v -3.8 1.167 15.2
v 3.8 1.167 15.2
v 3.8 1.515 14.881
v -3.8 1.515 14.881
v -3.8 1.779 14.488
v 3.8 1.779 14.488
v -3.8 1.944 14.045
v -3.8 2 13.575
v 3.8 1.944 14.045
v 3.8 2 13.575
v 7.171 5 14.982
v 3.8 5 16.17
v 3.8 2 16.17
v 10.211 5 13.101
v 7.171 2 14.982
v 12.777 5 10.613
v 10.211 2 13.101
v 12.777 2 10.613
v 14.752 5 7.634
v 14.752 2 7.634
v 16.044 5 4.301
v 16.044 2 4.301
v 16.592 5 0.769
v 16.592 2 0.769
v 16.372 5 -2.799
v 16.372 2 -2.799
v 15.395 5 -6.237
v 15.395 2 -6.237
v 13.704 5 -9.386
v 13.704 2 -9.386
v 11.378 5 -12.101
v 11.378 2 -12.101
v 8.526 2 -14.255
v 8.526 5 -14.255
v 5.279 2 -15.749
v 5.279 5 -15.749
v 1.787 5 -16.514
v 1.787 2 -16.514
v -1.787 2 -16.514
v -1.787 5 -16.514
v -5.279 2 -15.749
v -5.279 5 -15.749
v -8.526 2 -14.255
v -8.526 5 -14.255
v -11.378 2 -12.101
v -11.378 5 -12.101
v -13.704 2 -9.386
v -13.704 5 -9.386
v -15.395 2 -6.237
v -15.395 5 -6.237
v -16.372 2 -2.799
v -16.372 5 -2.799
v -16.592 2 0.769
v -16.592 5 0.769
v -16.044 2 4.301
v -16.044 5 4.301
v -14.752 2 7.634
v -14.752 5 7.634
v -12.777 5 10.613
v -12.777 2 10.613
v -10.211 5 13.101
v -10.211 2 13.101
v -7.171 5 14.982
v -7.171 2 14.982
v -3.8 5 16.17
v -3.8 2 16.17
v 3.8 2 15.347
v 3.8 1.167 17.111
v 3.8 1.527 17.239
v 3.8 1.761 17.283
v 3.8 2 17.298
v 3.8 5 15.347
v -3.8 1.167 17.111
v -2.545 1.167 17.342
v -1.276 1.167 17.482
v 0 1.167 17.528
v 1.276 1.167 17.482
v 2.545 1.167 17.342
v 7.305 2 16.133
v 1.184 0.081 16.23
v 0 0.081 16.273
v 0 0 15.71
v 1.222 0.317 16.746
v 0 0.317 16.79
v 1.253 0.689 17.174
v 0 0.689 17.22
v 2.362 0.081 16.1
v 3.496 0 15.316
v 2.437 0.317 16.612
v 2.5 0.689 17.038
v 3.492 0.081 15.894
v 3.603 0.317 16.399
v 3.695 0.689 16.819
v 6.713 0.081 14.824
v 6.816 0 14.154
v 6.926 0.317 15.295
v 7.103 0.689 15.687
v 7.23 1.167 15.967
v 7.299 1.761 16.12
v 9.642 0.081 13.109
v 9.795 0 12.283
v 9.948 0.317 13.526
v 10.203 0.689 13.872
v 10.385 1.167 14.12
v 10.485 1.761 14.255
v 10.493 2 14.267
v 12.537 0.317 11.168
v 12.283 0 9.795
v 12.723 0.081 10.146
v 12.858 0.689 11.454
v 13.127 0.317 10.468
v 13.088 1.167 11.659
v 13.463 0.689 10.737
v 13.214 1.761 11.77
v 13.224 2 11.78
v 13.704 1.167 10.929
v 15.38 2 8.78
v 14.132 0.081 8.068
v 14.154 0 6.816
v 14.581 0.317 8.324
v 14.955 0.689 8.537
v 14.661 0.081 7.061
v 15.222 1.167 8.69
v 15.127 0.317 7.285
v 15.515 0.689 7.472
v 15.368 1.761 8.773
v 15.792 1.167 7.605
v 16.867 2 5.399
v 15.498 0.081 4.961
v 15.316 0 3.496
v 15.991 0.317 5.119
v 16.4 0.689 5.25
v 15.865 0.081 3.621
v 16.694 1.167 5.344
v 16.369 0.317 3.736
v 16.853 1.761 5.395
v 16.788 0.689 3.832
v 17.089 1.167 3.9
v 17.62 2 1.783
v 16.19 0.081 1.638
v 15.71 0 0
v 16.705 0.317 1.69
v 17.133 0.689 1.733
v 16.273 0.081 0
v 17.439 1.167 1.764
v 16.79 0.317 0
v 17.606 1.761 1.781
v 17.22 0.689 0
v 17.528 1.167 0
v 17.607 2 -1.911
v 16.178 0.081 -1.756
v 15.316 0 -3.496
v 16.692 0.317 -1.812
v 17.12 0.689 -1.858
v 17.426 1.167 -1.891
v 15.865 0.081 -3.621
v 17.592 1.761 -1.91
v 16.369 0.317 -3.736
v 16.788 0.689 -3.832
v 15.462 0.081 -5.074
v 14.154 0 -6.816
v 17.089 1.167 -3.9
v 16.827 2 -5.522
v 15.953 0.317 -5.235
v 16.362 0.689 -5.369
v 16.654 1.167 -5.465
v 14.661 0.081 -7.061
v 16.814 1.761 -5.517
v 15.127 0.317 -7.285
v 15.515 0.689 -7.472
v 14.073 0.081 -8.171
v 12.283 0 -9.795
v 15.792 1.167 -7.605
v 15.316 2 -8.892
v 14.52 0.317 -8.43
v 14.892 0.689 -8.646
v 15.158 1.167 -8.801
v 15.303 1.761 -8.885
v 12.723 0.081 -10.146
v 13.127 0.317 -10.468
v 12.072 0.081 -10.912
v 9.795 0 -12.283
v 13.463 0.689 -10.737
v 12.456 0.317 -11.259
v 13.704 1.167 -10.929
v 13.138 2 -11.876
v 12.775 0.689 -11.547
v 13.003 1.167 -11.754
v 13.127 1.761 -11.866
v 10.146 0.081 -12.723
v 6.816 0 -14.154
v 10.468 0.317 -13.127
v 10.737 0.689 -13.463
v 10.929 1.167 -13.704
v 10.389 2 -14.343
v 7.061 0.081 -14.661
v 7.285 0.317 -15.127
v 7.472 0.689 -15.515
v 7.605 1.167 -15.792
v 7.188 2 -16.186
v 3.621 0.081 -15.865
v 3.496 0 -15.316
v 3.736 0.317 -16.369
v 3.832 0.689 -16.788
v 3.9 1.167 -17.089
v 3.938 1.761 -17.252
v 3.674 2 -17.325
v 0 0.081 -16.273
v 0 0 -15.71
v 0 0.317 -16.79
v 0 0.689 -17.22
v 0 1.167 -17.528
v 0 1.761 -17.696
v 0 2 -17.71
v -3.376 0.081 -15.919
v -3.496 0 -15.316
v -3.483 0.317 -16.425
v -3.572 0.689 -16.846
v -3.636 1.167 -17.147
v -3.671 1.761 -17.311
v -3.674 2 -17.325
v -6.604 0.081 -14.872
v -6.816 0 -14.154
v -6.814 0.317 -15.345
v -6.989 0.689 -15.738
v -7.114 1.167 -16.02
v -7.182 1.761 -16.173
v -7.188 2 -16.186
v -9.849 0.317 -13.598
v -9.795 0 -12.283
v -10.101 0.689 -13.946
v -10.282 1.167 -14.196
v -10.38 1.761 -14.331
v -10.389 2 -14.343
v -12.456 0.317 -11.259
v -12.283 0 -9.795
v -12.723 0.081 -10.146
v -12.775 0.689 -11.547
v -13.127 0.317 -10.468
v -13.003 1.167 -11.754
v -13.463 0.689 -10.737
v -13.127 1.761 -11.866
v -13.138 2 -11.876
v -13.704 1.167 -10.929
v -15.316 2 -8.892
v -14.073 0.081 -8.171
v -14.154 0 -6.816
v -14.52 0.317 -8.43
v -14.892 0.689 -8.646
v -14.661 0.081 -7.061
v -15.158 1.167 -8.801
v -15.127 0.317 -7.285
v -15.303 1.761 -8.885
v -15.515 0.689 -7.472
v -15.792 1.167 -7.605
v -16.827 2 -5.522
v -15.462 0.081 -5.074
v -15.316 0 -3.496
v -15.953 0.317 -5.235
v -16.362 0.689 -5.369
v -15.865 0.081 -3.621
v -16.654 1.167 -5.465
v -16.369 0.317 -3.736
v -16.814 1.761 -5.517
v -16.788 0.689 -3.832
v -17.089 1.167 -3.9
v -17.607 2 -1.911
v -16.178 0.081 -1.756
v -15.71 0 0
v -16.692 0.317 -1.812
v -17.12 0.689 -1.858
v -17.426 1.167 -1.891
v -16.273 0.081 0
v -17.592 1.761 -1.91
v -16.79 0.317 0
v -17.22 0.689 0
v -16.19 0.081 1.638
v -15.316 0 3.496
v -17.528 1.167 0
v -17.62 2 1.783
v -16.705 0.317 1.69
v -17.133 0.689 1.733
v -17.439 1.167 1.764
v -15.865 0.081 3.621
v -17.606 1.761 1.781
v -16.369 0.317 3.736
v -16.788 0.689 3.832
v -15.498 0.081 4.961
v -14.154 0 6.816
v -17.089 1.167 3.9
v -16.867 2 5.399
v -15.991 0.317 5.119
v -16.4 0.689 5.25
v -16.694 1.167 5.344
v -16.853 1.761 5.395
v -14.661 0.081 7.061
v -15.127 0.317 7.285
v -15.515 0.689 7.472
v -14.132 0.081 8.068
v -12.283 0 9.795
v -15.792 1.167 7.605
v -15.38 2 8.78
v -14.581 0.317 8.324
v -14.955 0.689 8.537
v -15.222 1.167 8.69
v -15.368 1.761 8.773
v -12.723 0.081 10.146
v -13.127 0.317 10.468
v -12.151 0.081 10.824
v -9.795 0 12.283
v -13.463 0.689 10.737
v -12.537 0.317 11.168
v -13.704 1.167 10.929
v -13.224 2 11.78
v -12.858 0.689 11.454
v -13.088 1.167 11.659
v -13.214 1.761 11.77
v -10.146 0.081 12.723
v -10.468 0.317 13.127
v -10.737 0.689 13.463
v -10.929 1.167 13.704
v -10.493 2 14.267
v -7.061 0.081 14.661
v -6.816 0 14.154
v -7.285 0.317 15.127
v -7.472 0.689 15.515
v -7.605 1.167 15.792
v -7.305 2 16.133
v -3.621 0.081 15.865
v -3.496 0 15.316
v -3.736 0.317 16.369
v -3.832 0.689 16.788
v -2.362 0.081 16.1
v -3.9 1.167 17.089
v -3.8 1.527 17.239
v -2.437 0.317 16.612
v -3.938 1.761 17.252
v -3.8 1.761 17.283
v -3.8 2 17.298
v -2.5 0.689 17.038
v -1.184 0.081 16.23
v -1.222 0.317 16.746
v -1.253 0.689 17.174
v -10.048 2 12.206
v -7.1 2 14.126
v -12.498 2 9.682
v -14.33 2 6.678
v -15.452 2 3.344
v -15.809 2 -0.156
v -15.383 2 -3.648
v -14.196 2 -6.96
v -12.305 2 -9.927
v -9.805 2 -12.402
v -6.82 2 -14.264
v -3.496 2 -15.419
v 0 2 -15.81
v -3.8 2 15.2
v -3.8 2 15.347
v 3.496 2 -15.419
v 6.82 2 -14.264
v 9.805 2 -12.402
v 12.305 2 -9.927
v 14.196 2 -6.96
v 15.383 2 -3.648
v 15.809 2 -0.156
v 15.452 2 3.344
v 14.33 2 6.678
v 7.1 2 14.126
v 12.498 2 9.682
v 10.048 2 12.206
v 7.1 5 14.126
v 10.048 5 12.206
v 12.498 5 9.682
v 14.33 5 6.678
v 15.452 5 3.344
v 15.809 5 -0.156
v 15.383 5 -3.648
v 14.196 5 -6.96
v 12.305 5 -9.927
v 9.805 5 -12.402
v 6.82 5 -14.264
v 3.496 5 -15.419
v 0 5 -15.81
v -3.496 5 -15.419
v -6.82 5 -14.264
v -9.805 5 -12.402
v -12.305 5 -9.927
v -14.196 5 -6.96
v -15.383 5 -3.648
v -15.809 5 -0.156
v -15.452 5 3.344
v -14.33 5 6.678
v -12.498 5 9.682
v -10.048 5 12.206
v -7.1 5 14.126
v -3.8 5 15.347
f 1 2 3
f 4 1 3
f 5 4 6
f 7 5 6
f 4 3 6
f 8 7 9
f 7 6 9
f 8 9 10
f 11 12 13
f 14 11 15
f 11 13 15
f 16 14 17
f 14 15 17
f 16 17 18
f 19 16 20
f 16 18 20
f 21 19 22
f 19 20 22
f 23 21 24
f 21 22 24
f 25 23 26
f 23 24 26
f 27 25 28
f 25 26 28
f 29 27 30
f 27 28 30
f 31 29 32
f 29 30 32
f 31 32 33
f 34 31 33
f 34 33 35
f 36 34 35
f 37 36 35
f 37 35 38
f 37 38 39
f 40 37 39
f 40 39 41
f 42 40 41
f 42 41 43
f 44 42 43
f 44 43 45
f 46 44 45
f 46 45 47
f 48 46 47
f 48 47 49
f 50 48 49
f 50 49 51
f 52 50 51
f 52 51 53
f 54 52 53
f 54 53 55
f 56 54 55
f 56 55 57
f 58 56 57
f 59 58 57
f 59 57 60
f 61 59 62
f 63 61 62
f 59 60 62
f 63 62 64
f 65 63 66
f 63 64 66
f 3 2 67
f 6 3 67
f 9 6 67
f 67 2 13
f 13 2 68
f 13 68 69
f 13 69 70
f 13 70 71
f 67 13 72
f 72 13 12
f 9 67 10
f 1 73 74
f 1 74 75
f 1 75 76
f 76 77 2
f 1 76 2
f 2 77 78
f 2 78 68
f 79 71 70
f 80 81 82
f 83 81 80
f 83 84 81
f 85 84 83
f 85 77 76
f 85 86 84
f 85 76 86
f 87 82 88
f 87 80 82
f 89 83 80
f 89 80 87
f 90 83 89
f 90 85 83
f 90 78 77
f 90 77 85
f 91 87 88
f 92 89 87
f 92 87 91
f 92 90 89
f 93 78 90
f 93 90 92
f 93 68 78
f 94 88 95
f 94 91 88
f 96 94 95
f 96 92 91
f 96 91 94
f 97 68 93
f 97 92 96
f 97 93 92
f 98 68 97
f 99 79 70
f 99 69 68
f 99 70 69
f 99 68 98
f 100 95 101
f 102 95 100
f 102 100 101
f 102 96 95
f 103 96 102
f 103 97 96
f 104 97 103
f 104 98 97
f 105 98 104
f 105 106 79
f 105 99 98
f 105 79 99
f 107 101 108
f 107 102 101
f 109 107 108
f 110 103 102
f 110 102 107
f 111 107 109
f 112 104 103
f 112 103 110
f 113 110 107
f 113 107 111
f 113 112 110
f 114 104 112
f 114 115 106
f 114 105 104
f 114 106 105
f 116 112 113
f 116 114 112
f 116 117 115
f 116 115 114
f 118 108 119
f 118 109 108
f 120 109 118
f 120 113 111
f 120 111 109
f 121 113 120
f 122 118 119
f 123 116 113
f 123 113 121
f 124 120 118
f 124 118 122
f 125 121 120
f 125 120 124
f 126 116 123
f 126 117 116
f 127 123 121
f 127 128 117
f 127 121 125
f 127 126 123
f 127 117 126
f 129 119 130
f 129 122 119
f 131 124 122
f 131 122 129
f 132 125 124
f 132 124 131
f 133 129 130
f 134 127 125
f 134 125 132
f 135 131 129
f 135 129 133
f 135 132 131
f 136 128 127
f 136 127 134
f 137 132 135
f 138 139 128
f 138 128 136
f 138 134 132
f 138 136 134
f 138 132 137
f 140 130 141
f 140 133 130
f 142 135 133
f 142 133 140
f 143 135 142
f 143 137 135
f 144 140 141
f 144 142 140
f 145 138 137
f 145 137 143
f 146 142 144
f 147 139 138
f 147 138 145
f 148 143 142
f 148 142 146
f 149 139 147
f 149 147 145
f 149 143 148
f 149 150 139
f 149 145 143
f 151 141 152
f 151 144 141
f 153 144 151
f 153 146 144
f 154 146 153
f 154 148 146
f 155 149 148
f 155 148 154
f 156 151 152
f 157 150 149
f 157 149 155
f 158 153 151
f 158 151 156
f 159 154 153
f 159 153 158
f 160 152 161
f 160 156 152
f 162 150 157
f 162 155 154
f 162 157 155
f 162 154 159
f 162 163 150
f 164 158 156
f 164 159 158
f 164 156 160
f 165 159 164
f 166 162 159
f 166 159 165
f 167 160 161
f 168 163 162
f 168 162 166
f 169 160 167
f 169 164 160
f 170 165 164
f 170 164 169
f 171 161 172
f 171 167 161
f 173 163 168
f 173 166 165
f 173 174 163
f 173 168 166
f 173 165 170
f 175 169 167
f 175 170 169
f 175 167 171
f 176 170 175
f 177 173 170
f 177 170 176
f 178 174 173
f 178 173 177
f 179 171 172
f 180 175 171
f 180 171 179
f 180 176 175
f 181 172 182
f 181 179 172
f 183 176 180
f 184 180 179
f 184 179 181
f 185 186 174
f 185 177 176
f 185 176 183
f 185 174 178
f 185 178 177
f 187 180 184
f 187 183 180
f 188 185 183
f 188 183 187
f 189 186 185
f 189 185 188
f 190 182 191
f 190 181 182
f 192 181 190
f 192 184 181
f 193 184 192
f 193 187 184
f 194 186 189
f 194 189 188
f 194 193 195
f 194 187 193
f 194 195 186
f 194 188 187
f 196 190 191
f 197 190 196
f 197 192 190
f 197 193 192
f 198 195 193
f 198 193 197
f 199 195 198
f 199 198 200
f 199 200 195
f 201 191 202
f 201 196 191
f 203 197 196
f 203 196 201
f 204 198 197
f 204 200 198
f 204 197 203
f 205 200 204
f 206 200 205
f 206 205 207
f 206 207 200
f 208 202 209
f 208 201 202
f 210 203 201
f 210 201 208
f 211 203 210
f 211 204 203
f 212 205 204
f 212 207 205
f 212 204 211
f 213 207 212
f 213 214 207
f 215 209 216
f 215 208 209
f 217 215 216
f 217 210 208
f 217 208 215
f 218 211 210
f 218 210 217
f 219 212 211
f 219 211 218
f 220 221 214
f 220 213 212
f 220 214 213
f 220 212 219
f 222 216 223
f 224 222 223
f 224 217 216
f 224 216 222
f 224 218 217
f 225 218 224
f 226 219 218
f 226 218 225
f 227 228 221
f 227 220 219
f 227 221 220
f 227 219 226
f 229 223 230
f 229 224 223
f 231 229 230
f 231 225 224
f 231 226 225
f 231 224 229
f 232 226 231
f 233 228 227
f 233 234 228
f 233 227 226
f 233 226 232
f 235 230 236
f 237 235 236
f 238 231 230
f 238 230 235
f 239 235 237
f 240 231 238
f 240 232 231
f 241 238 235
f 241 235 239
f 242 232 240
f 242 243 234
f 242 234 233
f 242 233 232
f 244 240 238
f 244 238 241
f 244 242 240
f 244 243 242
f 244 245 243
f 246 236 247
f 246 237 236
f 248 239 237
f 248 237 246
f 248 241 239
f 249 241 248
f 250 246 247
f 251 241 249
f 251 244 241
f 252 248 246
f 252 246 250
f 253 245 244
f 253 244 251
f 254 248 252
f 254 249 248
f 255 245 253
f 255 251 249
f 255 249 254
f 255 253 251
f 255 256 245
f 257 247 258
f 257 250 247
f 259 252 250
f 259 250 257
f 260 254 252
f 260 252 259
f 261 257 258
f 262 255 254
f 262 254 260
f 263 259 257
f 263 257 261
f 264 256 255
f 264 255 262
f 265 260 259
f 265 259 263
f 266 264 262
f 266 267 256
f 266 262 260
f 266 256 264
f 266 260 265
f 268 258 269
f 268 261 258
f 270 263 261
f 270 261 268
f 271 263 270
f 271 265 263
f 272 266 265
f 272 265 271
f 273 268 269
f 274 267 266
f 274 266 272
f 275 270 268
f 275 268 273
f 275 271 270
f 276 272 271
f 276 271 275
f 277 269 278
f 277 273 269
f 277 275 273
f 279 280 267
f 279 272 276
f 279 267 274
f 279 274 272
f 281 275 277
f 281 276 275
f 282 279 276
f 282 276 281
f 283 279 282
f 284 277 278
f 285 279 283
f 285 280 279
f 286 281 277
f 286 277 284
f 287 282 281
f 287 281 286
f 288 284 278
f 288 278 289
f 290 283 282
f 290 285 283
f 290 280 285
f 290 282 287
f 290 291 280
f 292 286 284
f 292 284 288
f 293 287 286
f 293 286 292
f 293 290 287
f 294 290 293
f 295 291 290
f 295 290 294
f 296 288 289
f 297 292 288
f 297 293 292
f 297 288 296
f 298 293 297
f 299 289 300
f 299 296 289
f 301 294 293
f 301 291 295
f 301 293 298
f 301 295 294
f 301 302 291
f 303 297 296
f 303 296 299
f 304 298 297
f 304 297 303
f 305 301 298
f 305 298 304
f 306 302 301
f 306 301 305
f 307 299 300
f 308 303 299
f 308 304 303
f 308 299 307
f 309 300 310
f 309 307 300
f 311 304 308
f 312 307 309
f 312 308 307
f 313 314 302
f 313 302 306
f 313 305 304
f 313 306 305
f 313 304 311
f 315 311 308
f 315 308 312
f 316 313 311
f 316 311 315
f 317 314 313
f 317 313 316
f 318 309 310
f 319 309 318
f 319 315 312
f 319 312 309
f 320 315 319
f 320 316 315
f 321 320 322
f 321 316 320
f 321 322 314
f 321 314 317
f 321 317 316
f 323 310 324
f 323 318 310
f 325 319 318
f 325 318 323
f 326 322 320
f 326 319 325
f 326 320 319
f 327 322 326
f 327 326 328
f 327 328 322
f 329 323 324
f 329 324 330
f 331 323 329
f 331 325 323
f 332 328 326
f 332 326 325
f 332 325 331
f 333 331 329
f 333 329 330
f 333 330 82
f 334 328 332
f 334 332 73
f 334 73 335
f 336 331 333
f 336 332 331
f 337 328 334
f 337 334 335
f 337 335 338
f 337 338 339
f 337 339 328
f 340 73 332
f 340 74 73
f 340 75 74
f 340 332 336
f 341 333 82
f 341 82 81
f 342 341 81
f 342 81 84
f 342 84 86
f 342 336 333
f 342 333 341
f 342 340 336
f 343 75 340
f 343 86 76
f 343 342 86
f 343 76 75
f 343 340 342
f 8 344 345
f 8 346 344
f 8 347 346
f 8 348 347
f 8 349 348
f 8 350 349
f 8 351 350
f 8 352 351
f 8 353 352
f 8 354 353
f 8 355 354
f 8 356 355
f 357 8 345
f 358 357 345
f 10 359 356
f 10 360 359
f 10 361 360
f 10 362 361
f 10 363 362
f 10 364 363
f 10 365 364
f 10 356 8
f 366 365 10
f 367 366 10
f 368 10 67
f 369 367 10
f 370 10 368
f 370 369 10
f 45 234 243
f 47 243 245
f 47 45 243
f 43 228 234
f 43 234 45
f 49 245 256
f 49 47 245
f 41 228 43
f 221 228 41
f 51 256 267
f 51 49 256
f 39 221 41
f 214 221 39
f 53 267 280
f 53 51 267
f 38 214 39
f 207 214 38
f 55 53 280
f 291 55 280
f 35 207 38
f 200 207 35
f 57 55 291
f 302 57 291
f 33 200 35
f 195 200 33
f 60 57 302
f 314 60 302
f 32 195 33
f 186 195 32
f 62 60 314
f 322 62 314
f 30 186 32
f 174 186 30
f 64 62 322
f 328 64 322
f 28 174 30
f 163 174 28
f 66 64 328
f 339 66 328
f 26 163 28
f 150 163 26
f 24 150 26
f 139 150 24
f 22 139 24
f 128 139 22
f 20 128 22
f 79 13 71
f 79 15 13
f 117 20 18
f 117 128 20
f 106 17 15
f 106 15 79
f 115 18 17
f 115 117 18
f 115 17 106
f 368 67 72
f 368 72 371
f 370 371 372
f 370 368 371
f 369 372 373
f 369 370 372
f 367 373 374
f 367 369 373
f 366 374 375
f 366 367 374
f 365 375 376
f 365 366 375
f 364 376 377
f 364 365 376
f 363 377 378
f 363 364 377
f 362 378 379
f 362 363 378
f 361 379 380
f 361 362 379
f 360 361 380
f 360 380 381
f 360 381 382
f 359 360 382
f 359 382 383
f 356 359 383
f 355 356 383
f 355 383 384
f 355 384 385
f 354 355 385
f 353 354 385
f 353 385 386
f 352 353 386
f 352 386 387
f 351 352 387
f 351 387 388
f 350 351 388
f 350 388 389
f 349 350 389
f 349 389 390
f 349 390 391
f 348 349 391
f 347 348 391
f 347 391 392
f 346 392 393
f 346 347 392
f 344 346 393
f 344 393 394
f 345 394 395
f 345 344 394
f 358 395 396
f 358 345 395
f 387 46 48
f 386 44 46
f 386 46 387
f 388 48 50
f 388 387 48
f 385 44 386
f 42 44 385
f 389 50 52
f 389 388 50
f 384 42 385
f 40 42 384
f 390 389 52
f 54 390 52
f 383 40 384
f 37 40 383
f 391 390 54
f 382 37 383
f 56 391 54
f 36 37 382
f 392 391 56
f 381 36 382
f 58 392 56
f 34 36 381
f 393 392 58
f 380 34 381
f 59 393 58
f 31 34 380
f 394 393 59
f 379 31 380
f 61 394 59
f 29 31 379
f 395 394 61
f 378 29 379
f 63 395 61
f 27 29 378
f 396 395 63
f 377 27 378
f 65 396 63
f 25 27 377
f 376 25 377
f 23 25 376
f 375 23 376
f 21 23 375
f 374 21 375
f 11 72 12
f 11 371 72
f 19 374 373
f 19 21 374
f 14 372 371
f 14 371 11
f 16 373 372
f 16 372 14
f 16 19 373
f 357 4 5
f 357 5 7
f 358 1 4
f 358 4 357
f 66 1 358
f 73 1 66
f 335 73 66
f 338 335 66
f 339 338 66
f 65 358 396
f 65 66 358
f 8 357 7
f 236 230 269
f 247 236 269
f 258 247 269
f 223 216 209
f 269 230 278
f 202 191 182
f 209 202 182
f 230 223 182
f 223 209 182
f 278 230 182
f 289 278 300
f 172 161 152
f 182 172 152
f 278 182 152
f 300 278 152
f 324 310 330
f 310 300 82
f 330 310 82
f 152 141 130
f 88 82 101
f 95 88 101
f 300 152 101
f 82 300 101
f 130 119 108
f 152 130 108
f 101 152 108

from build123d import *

# Parameters (mm, degrees)
SKETCH1_R           = 17.71
BOSS_EXTRUDE1_DEPTH = 2
SKETCH1_3_R         = 16.61
SKETCH1_3_R_2       = 15.81
BOSS_EXTRUDE2_DEPTH = 5
FILLET1_R           = 2
SKETCH3_W           = 7.599801802
SKETCH3_H           = 7.043482716
CUT_EXTRUDE1_DEPTH  = 4.8
FILLET2_R           = 2


# Some blends are built 0.0001 mm under size
with BuildPart() as part:
    # Sketch1 → Boss-Extrude1 (new body)
    with BuildSketch(Plane(origin=(0, 0, 0), x_dir=(1, 0, 0), z_dir=(0, 1, 0))):
        with Locations(Location((0, 0, 0), (0, 0, 270))):
            Circle(SKETCH1_R)
    extrude(amount=BOSS_EXTRUDE1_DEPTH)

    # Sketch1<3> → Boss-Extrude2 (add)
    with BuildSketch(Plane(origin=(0, 0, 0), x_dir=(1, 0, 0), z_dir=(0, 1, 0))):
        with Locations(Location((0, 0, 0), (0, 0, 270))):
            Circle(SKETCH1_3_R)
        with Locations(Location((0, 0, 0), (0, 0, 270))):
            Circle(SKETCH1_3_R_2, mode=Mode.SUBTRACT)
    extrude(amount=BOSS_EXTRUDE2_DEPTH)

    # Fillet1
    fillet1_edges = [part.edges().sort_by_distance(p)[0] for p in [
        (0, 0, -17.71),
    ]]
    fillet(fillet1_edges, radius=FILLET1_R - 0.0001)  # a hair under: the kernel refuses the full size

    # Sketch3 → Cut-Extrude1 (cut)
    with BuildSketch(Plane.XY.offset(20)):
        with Locations((0, 4.688271449)):
            Rectangle(SKETCH3_W, SKETCH3_H)
    extrude(amount=-CUT_EXTRUDE1_DEPTH, mode=Mode.SUBTRACT)

    # Fillet2
    # the kernel refuses this fillet: 2 mm, written as the material it takes off along each edge
    with BuildSketch(Plane(origin=(3.799900901, 2, 15.2), x_dir=(0, 0, -1), z_dir=(-1, 0, 0))) as fillet2_piece_1:
        with BuildLine():
            CenterArc((1.624563802, 2), FILLET2_R, 215.680517758, 54.319482242)
            Line((0, 0.833469909), (-0.032491276, 0.810139307))
            ThreePointArc((-0.032491276, 0.810139307), (-0.04, 0.416734955), (-0.04, 0))
            Line((-0.04, 0), (0, -0.04))
            Line((0, -0.04), (1.624563802, -0.04))
            Line((1.624563802, -0.04), (1.624563802, 0))
        make_face()
    extrude(amount=7.599801803, mode=Mode.SUBTRACT)


solid = part.part
